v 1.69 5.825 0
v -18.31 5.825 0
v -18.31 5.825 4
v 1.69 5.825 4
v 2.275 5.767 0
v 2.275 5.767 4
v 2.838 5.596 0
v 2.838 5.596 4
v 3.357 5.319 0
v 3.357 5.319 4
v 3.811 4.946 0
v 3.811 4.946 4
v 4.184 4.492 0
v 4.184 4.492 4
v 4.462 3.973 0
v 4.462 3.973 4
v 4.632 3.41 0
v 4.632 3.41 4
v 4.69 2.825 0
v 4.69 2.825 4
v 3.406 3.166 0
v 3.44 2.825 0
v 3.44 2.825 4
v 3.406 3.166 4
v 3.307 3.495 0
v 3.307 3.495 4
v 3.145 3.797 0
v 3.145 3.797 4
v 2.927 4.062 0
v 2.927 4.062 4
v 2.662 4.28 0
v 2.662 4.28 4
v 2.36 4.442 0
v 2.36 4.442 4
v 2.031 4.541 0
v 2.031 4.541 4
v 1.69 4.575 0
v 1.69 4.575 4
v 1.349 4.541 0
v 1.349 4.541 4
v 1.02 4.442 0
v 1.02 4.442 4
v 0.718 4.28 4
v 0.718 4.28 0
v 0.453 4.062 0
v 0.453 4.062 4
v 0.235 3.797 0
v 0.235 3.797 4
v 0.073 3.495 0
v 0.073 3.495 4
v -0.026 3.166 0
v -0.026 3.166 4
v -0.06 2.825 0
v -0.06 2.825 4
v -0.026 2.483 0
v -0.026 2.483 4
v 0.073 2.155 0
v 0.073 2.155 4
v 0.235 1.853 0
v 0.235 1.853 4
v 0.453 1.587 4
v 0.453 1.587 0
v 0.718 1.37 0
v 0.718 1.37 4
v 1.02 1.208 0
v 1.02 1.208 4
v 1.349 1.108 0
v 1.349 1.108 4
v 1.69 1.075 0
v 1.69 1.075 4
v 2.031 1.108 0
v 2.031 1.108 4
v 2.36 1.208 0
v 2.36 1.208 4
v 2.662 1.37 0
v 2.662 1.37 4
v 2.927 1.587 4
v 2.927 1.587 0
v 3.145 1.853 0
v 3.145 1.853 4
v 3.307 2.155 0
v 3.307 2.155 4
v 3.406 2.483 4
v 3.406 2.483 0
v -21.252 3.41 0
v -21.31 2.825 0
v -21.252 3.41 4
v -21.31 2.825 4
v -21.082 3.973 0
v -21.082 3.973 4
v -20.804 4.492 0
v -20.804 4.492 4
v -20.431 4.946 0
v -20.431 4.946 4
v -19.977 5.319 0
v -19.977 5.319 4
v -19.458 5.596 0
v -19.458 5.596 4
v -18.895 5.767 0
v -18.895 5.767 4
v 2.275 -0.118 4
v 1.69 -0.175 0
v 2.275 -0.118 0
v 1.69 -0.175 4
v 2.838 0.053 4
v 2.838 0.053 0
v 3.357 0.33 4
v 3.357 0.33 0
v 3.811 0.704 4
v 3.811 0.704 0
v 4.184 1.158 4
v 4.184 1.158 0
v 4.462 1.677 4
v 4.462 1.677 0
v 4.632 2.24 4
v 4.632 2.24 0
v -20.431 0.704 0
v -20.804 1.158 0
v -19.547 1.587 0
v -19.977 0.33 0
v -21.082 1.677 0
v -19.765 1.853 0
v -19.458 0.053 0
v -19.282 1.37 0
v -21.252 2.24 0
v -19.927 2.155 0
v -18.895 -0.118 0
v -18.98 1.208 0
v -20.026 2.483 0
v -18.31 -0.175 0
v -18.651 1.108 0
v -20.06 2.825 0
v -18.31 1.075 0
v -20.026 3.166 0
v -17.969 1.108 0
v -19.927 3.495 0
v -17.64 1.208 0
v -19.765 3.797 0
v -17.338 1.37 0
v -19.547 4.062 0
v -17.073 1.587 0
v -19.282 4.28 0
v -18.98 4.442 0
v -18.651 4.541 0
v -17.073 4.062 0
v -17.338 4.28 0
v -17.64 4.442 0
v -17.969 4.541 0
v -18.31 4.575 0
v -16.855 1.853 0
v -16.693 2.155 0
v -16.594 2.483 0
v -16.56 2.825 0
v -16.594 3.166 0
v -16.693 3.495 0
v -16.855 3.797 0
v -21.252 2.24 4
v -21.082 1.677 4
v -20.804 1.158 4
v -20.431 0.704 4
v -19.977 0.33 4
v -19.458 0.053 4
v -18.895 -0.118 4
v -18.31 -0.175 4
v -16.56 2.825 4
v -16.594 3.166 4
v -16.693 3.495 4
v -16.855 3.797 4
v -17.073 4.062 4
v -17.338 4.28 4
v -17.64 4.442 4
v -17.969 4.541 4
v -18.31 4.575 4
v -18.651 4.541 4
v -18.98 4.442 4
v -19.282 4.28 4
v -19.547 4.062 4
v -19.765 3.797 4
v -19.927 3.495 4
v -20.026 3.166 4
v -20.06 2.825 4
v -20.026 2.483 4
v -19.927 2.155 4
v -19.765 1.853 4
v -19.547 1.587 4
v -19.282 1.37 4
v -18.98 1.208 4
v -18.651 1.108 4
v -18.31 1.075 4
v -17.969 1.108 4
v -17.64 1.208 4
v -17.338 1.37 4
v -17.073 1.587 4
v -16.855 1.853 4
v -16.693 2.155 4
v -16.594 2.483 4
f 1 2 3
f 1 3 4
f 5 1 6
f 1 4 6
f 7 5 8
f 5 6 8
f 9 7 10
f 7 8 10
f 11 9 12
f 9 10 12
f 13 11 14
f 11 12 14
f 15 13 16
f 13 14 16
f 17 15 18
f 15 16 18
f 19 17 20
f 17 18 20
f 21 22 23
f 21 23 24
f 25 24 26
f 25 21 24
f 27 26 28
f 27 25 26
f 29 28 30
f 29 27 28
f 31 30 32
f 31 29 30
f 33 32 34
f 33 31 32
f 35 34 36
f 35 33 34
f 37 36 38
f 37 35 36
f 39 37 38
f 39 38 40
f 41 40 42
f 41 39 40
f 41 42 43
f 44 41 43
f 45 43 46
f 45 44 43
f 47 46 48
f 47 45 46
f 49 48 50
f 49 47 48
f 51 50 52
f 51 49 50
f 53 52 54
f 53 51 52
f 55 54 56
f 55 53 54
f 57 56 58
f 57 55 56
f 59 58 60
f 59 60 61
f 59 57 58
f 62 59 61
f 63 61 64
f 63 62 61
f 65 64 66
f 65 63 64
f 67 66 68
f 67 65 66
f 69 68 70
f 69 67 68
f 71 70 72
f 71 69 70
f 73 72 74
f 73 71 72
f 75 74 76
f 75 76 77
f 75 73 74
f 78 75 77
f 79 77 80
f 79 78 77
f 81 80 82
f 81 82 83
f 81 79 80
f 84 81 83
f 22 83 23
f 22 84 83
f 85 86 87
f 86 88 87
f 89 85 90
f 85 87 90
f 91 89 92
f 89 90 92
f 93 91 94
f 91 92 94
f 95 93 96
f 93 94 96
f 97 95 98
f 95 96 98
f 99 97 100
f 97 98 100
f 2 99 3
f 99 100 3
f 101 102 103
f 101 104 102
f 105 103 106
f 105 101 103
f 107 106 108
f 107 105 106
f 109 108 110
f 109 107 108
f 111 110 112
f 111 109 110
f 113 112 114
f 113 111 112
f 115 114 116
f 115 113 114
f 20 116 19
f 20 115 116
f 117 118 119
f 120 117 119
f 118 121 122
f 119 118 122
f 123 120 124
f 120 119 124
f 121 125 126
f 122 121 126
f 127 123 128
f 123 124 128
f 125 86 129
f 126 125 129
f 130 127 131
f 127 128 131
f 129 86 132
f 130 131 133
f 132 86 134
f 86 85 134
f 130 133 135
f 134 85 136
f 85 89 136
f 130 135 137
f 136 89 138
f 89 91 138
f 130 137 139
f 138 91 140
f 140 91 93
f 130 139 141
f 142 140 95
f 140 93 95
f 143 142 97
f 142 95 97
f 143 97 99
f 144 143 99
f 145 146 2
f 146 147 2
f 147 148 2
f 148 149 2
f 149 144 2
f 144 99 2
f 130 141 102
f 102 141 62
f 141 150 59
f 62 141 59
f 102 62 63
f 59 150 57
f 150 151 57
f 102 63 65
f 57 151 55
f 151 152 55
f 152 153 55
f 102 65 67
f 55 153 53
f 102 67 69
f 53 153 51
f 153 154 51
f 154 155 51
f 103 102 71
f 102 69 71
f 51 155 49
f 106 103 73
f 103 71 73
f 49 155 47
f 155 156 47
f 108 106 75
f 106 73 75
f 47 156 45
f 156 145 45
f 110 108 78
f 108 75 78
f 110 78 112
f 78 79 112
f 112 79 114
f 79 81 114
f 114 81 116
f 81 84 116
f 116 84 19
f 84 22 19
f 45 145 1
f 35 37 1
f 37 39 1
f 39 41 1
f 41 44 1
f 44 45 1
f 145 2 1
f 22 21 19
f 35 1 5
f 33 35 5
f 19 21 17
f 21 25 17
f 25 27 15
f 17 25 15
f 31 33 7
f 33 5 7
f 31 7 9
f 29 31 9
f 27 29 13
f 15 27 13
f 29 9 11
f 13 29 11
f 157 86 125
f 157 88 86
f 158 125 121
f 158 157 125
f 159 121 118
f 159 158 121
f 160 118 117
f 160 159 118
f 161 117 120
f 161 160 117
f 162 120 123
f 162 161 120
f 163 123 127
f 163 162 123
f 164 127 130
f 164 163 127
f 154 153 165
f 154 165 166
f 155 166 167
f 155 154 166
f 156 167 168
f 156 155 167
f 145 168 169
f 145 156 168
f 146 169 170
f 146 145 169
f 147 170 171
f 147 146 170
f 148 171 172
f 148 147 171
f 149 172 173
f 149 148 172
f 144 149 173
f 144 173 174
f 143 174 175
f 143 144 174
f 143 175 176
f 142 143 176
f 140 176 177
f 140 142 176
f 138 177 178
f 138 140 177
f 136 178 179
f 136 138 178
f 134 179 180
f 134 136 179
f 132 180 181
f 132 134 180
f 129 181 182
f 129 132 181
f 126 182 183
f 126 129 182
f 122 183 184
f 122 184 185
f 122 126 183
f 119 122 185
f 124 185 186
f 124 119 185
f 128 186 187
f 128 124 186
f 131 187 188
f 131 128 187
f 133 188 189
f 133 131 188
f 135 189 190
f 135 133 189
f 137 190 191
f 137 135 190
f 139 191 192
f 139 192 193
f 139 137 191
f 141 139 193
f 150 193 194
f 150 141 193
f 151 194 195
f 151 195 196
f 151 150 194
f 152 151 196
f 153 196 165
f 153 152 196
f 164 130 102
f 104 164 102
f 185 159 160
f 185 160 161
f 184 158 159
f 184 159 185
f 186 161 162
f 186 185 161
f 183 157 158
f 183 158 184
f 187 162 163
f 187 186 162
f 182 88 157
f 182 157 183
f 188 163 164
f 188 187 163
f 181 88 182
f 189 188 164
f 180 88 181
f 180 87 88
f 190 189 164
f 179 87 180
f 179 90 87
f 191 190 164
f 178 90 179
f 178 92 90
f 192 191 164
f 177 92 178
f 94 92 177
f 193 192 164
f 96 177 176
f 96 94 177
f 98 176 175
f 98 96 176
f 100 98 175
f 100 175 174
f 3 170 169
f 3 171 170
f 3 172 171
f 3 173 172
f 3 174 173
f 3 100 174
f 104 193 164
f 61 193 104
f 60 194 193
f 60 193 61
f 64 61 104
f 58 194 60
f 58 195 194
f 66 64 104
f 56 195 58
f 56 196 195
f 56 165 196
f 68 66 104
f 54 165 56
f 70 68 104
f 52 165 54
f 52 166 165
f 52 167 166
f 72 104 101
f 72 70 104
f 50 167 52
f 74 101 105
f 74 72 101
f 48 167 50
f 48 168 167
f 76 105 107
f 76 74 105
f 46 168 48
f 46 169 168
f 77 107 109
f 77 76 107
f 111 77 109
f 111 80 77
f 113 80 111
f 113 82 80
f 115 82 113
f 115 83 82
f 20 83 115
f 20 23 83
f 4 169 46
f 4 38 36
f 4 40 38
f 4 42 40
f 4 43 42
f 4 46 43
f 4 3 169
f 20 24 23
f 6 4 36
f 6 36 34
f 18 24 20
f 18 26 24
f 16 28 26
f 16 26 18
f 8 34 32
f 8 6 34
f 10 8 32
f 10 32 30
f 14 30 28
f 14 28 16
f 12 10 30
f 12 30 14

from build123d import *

# Parameters (mm, degrees)
CROQUIS1_W              = 26
CROQUIS1_H              = 6
CROQUIS1_R              = 1.75
SALIENTE_EXTRUIR1_DEPTH = 4
REDONDEO2_R             = 3


with BuildPart() as part:
    # Croquis1 → Saliente-Extruir1 (new body)
    with BuildSketch(Plane.XY):
        with Locations((-8.309993141, 2.824852585)):
            Rectangle(CROQUIS1_W, CROQUIS1_H)
        with Locations((1.690006859, 2.824852585)):
            Circle(CROQUIS1_R, mode=Mode.SUBTRACT)
        with Locations((-18.309993141, 2.824852585)):
            Circle(CROQUIS1_R, mode=Mode.SUBTRACT)
    extrude(amount=SALIENTE_EXTRUIR1_DEPTH)

    # Redondeo2
    redondeo2_edges = [part.edges().sort_by_distance(p)[0] for p in [
        (4.690006859, 5.824852585, 2),
        (4.690006859, -0.175147415, 2),
        (-21.309993141, 5.824852585, 2),
        (-21.309993141, -0.175147415, 2),
    ]]
    fillet(redondeo2_edges, radius=REDONDEO2_R - 0.0001)  # a hair under: the kernel refuses the full size


solid = part.part
